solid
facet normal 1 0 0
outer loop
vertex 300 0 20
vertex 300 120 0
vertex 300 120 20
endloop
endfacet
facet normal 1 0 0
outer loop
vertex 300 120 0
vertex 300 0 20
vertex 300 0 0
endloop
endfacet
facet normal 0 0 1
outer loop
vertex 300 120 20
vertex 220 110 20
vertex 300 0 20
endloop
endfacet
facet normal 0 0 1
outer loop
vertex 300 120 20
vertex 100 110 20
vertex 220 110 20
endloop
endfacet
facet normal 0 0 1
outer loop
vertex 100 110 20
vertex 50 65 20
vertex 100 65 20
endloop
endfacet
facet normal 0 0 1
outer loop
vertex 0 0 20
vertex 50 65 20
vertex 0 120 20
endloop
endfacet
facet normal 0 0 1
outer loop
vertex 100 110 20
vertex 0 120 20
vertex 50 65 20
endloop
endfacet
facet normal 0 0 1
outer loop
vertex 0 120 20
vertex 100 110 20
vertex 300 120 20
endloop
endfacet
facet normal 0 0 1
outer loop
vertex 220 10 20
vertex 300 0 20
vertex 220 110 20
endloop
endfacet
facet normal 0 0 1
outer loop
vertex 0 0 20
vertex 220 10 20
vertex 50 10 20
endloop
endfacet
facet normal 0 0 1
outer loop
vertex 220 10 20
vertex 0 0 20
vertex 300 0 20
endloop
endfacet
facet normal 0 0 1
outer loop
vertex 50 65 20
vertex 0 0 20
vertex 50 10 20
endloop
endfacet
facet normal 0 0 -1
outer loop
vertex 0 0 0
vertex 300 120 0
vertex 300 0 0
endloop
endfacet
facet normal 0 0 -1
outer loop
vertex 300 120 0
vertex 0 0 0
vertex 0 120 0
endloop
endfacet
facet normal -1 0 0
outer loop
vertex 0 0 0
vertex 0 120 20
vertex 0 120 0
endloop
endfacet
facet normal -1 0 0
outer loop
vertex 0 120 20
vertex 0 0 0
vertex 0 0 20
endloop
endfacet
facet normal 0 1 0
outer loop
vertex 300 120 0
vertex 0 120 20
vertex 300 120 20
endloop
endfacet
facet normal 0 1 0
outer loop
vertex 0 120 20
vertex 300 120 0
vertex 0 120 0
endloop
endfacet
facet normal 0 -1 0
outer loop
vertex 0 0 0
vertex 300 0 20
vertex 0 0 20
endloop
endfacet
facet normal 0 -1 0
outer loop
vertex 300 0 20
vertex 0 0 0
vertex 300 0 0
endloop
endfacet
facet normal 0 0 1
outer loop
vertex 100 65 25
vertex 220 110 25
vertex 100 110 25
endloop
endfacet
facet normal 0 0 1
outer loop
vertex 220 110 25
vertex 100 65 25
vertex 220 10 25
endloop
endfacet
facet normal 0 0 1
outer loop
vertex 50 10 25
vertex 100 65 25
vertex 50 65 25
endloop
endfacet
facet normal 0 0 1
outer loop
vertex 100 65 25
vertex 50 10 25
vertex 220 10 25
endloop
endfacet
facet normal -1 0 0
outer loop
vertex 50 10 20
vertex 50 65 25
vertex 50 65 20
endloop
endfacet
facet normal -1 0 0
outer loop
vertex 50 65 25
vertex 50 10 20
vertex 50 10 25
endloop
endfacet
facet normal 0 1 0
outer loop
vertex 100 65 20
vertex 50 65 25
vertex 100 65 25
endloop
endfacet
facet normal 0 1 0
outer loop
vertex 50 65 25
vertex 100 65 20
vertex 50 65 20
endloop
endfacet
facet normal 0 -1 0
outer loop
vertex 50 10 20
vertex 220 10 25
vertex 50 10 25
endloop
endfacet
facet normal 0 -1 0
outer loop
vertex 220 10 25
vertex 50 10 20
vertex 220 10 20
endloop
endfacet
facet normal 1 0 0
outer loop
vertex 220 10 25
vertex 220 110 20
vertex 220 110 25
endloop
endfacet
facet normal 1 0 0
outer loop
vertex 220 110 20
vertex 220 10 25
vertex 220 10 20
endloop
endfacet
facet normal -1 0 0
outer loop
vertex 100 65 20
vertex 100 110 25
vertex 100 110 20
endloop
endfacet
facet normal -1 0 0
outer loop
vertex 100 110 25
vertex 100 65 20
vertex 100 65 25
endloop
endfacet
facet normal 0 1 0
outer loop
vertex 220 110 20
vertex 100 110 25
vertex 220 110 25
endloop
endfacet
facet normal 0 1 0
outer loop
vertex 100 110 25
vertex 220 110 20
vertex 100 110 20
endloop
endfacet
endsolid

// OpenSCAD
// file: config.scad
// --- Robot Dimensions ---
track_width = 50;        // mm
sprocket_diameter = 50;  // mm
motor_length = 54;       // mm
motor_shaft = 6;         // D-shaft diameter
motor_mount_hole = 3;    // M3
battery_length = 75;     // mm
battery_width  = 55;     // mm
battery_height = 20;     // mm
jetson_plate_length = 120; // mm
jetson_plate_width  = 100; // mm
chassis_thickness = 5;      // mm
// main file
include <config.scad>;

// Main chassis base
module chassis() {
    length = 300;   // overall length
    width = track_width*2 + 20;
    height = 20;

    // Base plate
    cube([length, width, height]);

    // Battery compartment
    translate([50, 10, 5])
        cube([battery_length, battery_width, battery_height]);

    // Jetson Nano Dev Kit top plate
    translate([100, width/2 - jetson_plate_width/2, height])
        cube([jetson_plate_length, jetson_plate_width, 5]);
}

chassis();
